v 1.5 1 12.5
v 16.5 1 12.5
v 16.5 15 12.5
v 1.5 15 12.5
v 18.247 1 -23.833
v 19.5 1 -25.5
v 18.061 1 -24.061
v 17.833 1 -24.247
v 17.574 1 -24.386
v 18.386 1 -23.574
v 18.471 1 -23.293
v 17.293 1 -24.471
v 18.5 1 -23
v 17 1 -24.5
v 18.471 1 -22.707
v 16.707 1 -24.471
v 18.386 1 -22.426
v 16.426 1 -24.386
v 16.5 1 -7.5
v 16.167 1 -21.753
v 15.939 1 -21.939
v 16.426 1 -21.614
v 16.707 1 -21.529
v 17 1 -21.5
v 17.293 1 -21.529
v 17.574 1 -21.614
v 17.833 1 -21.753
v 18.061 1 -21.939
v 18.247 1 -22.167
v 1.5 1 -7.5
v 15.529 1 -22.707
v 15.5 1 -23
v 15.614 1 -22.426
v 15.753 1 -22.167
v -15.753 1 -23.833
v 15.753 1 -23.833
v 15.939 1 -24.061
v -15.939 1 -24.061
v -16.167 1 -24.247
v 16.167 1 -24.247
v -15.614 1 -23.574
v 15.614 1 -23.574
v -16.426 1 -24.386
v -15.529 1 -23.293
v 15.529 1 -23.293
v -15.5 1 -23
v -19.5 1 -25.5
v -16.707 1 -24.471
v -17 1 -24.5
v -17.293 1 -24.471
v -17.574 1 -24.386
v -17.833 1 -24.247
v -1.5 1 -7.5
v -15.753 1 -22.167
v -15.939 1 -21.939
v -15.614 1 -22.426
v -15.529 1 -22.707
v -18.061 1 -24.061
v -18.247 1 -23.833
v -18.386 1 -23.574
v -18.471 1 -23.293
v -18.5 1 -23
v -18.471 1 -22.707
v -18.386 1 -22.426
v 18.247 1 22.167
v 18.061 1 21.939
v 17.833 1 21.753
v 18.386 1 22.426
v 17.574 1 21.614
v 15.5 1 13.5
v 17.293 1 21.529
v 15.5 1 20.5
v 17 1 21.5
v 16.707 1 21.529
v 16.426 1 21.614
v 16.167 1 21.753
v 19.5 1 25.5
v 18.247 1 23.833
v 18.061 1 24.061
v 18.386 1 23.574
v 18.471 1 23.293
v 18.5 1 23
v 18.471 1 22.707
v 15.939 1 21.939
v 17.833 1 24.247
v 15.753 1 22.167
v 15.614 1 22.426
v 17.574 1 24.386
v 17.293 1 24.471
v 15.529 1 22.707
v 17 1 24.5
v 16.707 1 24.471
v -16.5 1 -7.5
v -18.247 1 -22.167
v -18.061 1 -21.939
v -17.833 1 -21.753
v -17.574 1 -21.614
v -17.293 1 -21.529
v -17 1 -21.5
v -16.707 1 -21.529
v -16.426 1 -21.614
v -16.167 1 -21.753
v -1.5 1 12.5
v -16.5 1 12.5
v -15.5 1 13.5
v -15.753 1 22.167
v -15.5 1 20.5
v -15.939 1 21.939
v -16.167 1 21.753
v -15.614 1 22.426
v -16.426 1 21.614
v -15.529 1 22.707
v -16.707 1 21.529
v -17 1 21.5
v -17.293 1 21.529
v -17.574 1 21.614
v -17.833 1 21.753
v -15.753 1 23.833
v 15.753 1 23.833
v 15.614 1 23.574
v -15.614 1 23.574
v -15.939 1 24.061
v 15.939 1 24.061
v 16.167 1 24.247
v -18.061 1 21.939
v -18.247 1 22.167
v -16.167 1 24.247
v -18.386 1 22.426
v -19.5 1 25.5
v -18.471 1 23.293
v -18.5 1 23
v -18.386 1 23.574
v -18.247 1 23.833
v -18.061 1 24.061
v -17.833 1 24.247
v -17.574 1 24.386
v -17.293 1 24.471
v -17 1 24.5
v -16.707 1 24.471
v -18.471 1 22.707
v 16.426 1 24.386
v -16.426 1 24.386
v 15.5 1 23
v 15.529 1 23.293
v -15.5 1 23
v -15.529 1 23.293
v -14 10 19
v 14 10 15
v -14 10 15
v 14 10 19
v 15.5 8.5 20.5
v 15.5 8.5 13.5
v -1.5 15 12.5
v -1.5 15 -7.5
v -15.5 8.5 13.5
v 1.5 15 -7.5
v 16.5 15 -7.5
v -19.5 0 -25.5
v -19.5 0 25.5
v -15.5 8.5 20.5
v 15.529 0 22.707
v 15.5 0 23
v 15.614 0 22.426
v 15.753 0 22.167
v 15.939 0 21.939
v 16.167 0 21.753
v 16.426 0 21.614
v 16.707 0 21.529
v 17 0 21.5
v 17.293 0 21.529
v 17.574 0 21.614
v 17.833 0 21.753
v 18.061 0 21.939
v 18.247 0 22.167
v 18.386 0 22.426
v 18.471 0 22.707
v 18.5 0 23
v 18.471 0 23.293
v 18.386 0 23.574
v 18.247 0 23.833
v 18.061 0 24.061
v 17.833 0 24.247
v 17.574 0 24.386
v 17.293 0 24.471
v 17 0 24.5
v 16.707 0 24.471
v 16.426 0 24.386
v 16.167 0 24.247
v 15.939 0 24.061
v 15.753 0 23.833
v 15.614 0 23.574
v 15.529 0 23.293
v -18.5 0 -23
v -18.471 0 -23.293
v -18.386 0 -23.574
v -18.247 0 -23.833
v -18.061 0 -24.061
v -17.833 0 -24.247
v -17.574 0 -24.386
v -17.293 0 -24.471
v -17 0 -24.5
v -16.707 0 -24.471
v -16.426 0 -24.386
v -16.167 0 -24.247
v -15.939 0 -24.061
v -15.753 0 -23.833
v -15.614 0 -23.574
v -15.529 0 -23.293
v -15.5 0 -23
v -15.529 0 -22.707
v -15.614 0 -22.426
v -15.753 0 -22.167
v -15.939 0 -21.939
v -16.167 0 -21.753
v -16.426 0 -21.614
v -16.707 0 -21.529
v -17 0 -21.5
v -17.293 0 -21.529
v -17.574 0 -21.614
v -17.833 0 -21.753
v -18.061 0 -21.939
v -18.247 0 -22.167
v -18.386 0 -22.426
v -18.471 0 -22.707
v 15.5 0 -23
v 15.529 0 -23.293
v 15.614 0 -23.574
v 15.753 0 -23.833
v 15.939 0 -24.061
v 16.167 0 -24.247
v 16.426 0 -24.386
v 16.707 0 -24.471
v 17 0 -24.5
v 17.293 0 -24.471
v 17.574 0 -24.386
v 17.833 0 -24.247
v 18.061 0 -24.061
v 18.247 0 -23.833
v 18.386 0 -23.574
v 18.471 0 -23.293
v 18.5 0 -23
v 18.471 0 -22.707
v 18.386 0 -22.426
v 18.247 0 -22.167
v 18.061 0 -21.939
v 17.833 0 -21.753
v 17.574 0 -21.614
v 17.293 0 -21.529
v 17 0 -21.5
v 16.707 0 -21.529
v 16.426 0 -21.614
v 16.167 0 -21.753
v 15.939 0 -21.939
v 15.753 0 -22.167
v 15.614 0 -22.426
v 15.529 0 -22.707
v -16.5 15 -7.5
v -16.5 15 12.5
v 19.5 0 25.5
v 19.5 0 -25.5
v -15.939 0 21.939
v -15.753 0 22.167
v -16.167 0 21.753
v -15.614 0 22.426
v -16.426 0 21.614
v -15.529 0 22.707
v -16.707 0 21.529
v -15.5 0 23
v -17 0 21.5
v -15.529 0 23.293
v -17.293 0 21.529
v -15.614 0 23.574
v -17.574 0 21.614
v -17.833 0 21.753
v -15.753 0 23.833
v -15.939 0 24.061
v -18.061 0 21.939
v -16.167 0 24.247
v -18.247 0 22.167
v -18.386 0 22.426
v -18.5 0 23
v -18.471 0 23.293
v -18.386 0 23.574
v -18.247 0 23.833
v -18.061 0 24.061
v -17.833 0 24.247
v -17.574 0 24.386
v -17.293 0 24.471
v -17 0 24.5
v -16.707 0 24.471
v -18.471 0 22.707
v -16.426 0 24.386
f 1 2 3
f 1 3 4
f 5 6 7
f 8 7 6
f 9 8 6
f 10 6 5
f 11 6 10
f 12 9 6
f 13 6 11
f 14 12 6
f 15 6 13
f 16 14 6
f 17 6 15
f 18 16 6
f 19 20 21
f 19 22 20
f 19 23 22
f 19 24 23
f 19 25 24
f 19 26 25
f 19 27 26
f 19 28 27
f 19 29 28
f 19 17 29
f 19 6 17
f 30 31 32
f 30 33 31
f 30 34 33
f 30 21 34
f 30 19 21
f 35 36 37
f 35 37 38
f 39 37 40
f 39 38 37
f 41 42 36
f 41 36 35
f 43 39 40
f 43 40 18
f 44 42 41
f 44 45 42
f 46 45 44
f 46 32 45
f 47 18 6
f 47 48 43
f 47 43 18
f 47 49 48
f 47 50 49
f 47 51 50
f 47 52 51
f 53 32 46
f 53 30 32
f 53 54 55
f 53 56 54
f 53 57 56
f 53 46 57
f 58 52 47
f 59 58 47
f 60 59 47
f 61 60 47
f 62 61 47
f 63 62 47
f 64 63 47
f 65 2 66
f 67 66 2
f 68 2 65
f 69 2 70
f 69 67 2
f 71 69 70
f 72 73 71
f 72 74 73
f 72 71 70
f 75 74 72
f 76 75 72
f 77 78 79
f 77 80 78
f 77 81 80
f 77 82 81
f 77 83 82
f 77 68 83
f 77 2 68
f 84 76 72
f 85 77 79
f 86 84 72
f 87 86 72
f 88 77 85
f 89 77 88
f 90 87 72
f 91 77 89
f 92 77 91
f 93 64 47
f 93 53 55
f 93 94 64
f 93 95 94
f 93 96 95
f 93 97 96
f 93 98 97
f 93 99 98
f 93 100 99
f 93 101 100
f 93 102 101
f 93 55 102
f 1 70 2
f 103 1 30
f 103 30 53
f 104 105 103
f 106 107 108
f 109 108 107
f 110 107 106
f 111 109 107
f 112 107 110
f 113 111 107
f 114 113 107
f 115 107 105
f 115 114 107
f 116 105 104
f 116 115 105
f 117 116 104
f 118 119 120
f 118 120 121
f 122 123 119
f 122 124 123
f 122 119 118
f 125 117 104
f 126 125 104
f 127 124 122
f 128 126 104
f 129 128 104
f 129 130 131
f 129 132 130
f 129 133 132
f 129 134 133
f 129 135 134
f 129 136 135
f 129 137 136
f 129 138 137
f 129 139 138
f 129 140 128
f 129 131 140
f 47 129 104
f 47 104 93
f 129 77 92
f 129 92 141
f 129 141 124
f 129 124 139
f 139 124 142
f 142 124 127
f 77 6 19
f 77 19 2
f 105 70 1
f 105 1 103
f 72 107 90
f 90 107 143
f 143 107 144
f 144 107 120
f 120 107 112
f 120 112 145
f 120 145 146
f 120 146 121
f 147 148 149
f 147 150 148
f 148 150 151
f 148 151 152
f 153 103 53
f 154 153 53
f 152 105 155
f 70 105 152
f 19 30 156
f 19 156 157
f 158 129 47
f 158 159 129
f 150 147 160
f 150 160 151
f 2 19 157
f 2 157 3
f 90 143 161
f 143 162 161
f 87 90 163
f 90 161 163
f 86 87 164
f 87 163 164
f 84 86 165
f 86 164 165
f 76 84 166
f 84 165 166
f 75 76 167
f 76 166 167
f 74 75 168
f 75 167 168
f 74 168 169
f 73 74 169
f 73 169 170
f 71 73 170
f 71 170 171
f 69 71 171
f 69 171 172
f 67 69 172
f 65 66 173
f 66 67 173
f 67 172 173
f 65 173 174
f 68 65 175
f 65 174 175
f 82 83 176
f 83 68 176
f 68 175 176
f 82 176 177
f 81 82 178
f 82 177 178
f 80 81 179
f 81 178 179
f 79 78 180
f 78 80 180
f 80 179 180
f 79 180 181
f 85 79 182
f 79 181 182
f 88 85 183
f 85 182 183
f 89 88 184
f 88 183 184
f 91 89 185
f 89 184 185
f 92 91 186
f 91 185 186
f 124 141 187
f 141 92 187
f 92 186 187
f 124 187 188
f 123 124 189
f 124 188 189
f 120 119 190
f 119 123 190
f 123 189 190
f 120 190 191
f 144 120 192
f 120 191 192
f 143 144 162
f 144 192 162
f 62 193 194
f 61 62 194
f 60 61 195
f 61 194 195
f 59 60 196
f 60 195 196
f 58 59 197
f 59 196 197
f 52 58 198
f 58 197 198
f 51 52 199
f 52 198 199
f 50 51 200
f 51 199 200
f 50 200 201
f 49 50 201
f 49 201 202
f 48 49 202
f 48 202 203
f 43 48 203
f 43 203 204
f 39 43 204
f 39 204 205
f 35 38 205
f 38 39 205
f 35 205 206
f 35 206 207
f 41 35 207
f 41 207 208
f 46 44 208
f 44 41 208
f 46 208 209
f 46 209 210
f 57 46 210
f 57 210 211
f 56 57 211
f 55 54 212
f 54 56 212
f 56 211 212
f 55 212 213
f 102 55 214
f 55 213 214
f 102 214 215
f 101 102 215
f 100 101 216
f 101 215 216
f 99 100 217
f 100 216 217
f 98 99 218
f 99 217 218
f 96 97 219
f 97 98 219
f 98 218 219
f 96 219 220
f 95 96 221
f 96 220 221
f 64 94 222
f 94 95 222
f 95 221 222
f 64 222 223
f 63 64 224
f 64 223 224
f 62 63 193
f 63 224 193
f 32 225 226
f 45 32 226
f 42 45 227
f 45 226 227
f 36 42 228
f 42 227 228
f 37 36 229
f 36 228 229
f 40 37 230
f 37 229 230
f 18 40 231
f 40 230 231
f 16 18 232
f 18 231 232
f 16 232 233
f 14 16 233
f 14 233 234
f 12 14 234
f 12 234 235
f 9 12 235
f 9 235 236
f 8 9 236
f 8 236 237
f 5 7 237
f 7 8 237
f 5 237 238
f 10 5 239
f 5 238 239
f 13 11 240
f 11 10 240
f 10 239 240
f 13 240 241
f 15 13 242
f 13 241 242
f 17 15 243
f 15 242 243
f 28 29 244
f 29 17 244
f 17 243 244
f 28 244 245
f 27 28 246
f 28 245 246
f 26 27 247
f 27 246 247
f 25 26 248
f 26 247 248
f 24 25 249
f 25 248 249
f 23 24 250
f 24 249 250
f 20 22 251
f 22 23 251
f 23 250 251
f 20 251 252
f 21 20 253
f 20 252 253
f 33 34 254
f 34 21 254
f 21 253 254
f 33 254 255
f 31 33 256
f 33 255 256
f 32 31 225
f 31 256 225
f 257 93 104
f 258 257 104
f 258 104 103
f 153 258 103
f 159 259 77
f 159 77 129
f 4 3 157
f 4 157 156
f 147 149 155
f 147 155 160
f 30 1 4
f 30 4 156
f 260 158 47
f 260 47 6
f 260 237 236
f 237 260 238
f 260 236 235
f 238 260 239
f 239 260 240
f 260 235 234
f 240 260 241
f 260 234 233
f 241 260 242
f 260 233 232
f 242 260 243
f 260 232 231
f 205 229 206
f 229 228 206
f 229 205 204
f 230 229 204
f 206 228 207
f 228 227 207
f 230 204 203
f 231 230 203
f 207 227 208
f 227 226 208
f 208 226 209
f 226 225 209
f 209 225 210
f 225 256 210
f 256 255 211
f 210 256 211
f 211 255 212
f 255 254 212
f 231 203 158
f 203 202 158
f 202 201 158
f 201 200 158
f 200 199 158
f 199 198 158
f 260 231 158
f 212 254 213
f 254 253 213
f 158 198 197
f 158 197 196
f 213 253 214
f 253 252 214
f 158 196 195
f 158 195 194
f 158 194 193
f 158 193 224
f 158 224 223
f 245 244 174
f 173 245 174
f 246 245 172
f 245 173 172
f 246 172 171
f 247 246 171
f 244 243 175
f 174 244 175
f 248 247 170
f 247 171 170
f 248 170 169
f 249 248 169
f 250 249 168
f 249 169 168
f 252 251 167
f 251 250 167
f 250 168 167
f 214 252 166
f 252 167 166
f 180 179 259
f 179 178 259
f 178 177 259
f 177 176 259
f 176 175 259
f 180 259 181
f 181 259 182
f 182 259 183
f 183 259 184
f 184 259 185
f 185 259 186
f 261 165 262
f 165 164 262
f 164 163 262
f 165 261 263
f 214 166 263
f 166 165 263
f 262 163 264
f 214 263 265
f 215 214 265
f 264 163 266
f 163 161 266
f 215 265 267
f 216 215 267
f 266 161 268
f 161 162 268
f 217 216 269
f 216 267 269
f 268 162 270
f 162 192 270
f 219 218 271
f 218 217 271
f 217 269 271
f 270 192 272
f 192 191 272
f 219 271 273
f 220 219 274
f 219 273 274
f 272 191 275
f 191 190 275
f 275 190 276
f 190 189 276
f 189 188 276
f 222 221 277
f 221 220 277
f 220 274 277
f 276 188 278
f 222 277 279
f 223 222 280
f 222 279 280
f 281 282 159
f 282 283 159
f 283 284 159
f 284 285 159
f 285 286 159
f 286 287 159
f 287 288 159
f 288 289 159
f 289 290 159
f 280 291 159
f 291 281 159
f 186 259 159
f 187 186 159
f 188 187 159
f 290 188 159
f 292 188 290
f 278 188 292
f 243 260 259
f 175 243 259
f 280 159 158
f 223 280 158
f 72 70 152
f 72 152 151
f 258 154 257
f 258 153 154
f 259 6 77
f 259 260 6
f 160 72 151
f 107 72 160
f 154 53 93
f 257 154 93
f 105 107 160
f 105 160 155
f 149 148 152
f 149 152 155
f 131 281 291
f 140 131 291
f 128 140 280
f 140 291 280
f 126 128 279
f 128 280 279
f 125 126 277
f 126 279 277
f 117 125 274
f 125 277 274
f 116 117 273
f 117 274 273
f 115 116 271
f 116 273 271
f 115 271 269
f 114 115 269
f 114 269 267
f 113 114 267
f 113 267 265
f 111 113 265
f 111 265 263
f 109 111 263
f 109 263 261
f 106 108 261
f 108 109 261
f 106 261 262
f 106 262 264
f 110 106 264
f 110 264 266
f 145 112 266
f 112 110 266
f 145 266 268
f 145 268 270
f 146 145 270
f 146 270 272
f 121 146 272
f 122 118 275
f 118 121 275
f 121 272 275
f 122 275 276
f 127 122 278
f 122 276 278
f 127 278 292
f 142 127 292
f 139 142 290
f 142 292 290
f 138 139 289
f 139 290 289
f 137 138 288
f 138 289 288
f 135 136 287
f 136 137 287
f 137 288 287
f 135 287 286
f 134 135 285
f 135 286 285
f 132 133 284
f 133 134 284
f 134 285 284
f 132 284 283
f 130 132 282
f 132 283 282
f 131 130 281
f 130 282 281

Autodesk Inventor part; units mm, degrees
ref_plane "YZ Plane" through (0, 0, 0) normal (1, 0, 0) x (0, 1, 0)
ref_plane "XZ Plane" through (0, 0, 0) normal (0, 1, 0) x (-1, 0, 0)
ref_plane "XY Plane" through (0, 0, 0) normal (0, 0, 1) x (1, 0, 0)
sketch "Skizze1" plane through (0, 0, 0) normal (0, 1, 0) x (-1, 0, 0)
  line L0 (19.5, -25.5) -> (-19.5, -25.5)
  line L1 (-19.5, -25.5) -> (-19.5, 25.5)
  line L2 (-19.5, 25.5) -> (19.5, 25.5)
  line L3 (19.5, 25.5) -> (19.5, -25.5)
  line L4 (0, -35.7) -> (0, 35.7) projected
  line L5 (27.3, 0) -> (-27.3, 0) projected
  circle A0 centre (17, -23) radius 1.5
  circle A1 centre (-17, -23) radius 1.5
  circle A2 centre (17, 23) radius 1.5
  circle A3 centre (-17, 23) radius 1.5
  line L6 (15.5, 13.5) -> (-15.5, 13.5)
  line L7 (-15.5, 13.5) -> (-15.5, 20.5)
  line L8 (-15.5, 20.5) -> (15.5, 20.5)
  line L9 (15.5, 20.5) -> (15.5, 13.5)
  line L10 (16.5, 12.5) -> (1.5, 12.5)
  line L11 (1.5, 12.5) -> (1.5, -7.5)
  line L12 (1.5, -7.5) -> (16.5, -7.5)
  line L13 (16.5, -7.5) -> (16.5, 12.5)
  line L14 (-16.5, 12.5) -> (-1.5, 12.5)
  line L15 (-1.5, 12.5) -> (-1.5, -7.5)
  line L16 (-1.5, -7.5) -> (-16.5, -7.5)
  line L17 (-16.5, -7.5) -> (-16.5, 12.5)
  point P0 (0, 0)
  dimension "d0" = 39
  dimension "d1" = 51
  dimension "d2" = 3
  dimension "d3" = 2.5
  dimension "d4" = 2.5
  dimension "d5" = 7
  dimension "d6" = 5
  dimension "d7" = 31
  dimension "d8" = 15
  dimension "d9" = 20
  dimension "d19" = 3
  dimension "d20" = 13
extrude "Extrusion1" add sketch "Skizze1" along normal blind 1
extrude "Extrusion2" add sketch "Skizze1" along normal blind 10 contours L6 L7 L8 L4 | L4 L8 L9 L6
extrude "Extrusion3" add sketch "Skizze1" along normal blind 15 contours L13 L12 L11 L5 | L5 L11 L10 L13 | L15 L16 L17 L5 | L5 L17 L14 L15
chamfer "Fase1" distance 1.5 angle 45 4 edges at (0, 10, 20.5) (15.5, 10, 17) (0, 10, 13.5) (-15.5, 10, 17)
properties part number "Relais"
